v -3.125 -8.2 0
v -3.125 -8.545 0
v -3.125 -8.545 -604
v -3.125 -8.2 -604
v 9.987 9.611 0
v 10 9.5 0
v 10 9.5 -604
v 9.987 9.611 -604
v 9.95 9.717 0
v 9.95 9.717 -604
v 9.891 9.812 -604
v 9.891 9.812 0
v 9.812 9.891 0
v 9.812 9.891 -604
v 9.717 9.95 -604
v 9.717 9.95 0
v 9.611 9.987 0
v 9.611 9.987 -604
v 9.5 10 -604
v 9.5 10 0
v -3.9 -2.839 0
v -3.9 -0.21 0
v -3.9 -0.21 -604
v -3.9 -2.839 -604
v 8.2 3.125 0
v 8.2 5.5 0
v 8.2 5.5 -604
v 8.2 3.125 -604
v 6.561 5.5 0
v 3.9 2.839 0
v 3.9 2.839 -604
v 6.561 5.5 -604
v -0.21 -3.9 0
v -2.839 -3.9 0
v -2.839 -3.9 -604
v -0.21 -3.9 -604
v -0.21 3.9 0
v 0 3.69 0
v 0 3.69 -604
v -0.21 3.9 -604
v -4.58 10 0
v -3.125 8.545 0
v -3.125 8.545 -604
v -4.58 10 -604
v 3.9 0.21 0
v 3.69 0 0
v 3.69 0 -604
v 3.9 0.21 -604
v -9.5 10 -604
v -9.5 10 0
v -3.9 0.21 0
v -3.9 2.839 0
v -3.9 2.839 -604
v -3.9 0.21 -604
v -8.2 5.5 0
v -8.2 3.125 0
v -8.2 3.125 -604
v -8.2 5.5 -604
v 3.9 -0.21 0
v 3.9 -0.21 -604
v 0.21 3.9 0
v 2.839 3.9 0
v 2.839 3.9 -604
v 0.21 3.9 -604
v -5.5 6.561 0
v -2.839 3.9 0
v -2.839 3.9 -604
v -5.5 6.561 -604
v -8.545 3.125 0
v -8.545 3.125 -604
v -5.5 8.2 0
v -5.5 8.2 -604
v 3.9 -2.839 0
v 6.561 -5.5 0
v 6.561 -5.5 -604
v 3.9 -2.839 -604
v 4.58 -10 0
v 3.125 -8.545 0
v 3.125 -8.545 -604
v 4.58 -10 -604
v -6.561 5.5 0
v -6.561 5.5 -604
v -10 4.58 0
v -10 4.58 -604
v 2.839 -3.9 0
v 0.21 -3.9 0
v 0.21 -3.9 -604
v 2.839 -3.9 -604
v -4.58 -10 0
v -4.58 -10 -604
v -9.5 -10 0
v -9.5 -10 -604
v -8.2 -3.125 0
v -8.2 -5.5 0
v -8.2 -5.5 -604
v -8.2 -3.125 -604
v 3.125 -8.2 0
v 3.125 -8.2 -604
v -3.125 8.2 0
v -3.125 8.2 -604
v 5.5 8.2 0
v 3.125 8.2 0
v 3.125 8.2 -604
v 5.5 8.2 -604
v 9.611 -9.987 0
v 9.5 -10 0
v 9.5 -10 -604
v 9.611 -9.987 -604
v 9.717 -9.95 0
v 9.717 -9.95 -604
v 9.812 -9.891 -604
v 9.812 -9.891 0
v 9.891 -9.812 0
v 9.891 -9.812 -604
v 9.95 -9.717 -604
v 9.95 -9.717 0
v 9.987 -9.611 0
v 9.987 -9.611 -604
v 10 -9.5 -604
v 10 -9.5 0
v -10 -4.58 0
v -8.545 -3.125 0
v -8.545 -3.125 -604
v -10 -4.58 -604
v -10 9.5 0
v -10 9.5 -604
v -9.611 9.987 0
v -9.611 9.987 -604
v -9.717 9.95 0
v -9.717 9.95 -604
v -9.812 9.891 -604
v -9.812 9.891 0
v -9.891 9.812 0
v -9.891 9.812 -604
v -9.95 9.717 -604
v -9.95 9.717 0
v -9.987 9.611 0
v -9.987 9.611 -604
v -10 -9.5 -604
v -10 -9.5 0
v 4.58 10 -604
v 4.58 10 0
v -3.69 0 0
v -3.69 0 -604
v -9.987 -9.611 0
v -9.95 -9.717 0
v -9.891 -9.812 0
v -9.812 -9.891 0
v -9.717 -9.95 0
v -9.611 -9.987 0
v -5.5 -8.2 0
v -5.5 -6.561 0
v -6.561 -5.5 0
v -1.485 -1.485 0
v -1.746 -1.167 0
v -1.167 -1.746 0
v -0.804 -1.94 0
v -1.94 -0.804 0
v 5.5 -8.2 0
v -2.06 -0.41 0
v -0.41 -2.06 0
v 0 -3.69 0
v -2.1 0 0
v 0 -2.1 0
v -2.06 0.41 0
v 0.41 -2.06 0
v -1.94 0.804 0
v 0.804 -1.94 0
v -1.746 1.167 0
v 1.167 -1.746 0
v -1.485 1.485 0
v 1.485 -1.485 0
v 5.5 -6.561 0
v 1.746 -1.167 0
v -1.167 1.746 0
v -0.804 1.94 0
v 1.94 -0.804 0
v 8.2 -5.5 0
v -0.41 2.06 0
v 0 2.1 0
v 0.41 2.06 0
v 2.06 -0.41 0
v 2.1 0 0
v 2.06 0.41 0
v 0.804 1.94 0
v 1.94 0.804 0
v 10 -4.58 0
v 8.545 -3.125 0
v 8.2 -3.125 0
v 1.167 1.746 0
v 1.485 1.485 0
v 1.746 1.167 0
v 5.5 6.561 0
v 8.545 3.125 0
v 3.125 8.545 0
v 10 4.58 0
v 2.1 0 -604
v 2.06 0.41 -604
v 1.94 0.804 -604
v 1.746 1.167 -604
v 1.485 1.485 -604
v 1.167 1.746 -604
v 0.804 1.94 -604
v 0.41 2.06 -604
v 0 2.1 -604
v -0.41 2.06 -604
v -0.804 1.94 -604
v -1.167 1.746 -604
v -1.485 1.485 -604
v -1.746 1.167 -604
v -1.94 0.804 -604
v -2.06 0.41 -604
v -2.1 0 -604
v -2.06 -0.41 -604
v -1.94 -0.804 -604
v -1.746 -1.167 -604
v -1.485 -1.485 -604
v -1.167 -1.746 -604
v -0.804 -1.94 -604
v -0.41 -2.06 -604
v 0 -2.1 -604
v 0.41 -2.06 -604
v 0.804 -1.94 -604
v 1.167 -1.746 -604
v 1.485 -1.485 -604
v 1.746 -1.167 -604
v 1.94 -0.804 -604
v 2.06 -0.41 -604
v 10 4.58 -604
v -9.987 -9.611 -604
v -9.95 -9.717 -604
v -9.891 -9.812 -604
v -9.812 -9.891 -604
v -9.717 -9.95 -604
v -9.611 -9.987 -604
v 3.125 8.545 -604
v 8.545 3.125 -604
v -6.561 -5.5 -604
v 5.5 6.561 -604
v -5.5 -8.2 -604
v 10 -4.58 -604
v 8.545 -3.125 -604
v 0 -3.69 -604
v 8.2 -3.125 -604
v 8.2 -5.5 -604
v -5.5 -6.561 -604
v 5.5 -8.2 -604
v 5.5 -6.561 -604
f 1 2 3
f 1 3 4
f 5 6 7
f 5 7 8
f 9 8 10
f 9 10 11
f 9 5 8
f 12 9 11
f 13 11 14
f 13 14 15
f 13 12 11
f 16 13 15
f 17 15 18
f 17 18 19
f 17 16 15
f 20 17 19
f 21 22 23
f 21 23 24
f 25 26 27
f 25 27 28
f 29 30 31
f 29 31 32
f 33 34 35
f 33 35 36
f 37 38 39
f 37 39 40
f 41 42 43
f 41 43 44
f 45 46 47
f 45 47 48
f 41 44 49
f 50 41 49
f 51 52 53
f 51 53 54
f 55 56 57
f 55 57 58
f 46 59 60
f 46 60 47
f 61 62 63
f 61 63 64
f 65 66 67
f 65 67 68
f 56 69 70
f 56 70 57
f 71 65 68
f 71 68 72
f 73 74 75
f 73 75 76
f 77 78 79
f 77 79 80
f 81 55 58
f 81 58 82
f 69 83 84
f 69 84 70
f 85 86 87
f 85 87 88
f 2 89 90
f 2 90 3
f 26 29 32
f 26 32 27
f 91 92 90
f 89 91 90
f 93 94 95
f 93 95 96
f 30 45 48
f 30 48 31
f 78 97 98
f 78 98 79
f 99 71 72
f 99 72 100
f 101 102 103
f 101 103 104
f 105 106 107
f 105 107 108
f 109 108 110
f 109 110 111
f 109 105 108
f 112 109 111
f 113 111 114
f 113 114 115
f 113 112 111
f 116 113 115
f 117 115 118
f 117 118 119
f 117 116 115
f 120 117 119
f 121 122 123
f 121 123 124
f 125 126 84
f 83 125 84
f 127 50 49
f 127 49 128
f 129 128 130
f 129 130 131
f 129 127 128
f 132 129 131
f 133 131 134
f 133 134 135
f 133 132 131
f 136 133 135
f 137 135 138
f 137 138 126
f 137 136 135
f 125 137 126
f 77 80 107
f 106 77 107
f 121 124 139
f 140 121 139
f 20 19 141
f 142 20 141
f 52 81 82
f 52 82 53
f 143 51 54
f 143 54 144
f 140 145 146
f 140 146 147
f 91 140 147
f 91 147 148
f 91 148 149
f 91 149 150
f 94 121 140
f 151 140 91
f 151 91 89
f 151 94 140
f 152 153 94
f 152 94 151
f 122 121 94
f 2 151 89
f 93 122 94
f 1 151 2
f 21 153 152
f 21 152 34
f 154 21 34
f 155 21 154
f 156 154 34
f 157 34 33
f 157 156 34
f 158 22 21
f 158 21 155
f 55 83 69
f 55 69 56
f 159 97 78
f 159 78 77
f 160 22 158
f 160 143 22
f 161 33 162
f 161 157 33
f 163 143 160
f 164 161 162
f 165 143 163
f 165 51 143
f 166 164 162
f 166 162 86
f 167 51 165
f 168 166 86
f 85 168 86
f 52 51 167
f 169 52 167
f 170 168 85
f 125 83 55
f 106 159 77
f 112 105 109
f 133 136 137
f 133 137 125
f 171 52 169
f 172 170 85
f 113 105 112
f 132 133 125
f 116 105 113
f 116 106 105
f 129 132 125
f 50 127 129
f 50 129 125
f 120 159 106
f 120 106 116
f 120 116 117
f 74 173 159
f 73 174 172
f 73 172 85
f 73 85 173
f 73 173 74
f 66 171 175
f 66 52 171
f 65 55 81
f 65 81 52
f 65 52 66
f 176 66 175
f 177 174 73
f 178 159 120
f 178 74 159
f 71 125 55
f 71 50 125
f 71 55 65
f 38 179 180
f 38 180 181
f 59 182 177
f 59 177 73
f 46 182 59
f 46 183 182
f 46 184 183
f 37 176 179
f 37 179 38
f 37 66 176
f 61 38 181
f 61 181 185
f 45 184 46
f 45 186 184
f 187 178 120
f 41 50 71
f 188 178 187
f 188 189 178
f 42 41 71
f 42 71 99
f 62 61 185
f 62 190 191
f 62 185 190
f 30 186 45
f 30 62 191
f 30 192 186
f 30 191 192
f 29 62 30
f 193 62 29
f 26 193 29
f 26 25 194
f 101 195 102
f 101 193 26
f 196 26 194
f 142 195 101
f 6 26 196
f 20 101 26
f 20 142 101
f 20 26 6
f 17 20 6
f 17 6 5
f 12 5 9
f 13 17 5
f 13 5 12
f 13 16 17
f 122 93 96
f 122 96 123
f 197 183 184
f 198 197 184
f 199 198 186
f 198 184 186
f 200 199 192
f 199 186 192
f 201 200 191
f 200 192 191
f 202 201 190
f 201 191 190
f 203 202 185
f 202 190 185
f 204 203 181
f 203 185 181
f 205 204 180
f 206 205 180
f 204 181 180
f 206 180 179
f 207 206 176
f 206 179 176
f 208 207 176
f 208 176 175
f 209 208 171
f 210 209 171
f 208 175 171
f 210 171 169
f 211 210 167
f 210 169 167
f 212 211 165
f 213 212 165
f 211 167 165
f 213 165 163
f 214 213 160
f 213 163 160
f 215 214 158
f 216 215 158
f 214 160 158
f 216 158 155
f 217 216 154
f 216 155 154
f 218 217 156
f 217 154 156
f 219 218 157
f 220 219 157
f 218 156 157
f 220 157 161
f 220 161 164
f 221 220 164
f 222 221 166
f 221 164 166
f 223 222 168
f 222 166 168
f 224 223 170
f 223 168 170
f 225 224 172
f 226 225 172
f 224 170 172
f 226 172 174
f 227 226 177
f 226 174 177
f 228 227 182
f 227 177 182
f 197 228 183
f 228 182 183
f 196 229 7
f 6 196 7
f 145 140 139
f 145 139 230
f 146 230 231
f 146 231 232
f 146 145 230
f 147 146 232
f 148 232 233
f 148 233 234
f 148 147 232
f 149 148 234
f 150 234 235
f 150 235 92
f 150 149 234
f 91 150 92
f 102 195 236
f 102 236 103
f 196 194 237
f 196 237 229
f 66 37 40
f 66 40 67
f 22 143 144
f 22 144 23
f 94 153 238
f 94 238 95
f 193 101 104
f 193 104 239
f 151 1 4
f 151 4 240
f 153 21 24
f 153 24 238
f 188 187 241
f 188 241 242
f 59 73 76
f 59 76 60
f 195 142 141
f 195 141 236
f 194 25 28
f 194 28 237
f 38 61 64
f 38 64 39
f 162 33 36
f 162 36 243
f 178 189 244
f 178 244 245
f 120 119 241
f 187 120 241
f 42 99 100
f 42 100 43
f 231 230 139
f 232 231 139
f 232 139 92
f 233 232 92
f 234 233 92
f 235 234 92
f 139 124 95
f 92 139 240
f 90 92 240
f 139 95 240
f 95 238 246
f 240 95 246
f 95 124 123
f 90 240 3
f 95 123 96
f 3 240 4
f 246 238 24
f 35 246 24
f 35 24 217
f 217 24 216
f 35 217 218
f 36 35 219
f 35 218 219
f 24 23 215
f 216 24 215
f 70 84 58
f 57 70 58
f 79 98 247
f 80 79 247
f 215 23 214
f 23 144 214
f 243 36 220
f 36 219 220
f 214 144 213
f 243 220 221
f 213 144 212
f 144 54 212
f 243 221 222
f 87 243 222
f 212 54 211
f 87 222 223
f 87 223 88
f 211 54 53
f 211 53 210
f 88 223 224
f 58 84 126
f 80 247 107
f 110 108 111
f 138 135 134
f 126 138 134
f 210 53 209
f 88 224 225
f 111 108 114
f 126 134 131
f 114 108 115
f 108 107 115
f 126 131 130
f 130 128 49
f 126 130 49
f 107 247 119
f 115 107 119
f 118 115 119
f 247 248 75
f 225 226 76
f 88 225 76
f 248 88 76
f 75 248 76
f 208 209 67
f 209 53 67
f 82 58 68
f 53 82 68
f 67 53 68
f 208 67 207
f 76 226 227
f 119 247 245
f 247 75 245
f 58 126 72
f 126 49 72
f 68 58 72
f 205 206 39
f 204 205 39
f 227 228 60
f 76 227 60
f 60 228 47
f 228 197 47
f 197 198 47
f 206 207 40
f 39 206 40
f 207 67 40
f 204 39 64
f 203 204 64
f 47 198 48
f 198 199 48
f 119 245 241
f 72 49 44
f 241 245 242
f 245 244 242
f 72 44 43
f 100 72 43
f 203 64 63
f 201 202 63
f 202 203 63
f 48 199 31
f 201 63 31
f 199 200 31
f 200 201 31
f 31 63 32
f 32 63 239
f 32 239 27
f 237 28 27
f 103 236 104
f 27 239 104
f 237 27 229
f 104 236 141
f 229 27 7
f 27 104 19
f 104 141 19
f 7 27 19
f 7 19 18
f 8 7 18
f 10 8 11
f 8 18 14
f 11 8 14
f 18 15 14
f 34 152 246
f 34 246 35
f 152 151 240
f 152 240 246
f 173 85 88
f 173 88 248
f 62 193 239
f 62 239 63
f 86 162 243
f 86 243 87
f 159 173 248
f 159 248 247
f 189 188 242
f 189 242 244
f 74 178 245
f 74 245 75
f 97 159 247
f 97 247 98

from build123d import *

# Parameters (mm, degrees)
SKETCH1_R           = 2.1
BOSS_EXTRUDE1_DEPTH = 604


with BuildPart() as part:
    # Sketch1 → Boss-Extrude1 (new body)
    with BuildSketch(Plane.XY):
        with BuildLine():
            Line((9.5, 10), (4.58, 10))
            Line((4.58, 10), (3.125, 8.545))
            Line((3.125, 8.545), (3.125, 8.2))
            Line((3.125, 8.2), (5.5, 8.2))
            Line((5.5, 8.2), (5.5, 6.560660172))
            Line((5.5, 6.560660172), (2.839339828, 3.9))
            Line((2.839339828, 3.9), (0.21, 3.9))
            Line((0.21, 3.9), (0, 3.69))
            Line((0, 3.69), (-0.21, 3.9))
            Line((-0.21, 3.9), (-2.839339828, 3.9))
            Line((-2.839339828, 3.9), (-5.5, 6.560660172))
            Line((-5.5, 6.560660172), (-5.5, 8.2))
            Line((-5.5, 8.2), (-3.125, 8.2))
            Line((-3.125, 8.2), (-3.125, 8.545))
            Line((-3.125, 8.545), (-4.58, 10))
            Line((-4.58, 10), (-9.5, 10))
            ThreePointArc((-9.5, 10), (-9.853553391, 9.853553391), (-10, 9.5))
            Line((-10, 9.5), (-10, 4.58))
            Line((-10, 4.58), (-8.545, 3.125))
            Line((-8.545, 3.125), (-8.2, 3.125))
            Line((-8.2, 3.125), (-8.2, 5.5))
            Line((-8.2, 5.5), (-6.560660172, 5.5))
            Line((-6.560660172, 5.5), (-3.9, 2.839339828))
            Line((-3.9, 2.839339828), (-3.9, 0.21))
            Line((-3.9, 0.21), (-3.69, 0))
            Line((-3.69, 0), (-3.9, -0.21))
            Line((-3.9, -0.21), (-3.9, -2.839339828))
            Line((-3.9, -2.839339828), (-6.560660172, -5.5))
            Line((-6.560660172, -5.5), (-8.2, -5.5))
            Line((-8.2, -5.5), (-8.2, -3.125))
            Line((-8.2, -3.125), (-8.545, -3.125))
            Line((-8.545, -3.125), (-10, -4.58))
            Line((-10, -4.58), (-10, -9.5))
            ThreePointArc((-10, -9.5), (-9.853553391, -9.853553391), (-9.5, -10))
            Line((-9.5, -10), (-4.58, -10))
            Line((-4.58, -10), (-3.125, -8.545))
            Line((-3.125, -8.545), (-3.125, -8.2))
            Line((-3.125, -8.2), (-5.5, -8.2))
            Line((-5.5, -8.2), (-5.5, -6.560660172))
            Line((-5.5, -6.560660172), (-2.839339828, -3.9))
            Line((-2.839339828, -3.9), (-0.21, -3.9))
            Line((-0.21, -3.9), (0, -3.69))
            Line((0, -3.69), (0.21, -3.9))
            Line((0.21, -3.9), (2.839339828, -3.9))
            Line((2.839339828, -3.9), (5.5, -6.560660172))
            Line((5.5, -6.560660172), (5.5, -8.2))
            Line((5.5, -8.2), (3.125, -8.2))
            Line((3.125, -8.2), (3.125, -8.545))
            Line((3.125, -8.545), (4.58, -10))
            Line((4.58, -10), (9.5, -10))
            ThreePointArc((9.5, -10), (9.853553391, -9.853553391), (10, -9.5))
            Line((10, -9.5), (10, -4.58))
            Line((10, -4.58), (8.545, -3.125))
            Line((8.545, -3.125), (8.2, -3.125))
            Line((8.2, -3.125), (8.2, -5.5))
            Line((8.2, -5.5), (6.560660172, -5.5))
            Line((6.560660172, -5.5), (3.9, -2.839339828))
            Line((3.9, -2.839339828), (3.9, -0.21))
            Line((3.9, -0.21), (3.69, 0))
            Line((3.69, 0), (3.9, 0.21))
            Line((3.9, 0.21), (3.9, 2.839339829))
            Line((3.9, 2.839339829), (6.560660171, 5.5))
            Line((6.560660171, 5.5), (8.2, 5.5))
            Line((8.2, 5.5), (8.2, 3.125))
            Line((8.2, 3.125), (8.545, 3.125))
            Line((8.545, 3.125), (10, 4.58))
            Line((10, 4.58), (10, 9.5))
            ThreePointArc((10, 9.5), (9.853553391, 9.853553391), (9.5, 10))
        make_face()
        Circle(SKETCH1_R, mode=Mode.SUBTRACT)
    extrude(amount=-BOSS_EXTRUDE1_DEPTH)


solid = part.part
